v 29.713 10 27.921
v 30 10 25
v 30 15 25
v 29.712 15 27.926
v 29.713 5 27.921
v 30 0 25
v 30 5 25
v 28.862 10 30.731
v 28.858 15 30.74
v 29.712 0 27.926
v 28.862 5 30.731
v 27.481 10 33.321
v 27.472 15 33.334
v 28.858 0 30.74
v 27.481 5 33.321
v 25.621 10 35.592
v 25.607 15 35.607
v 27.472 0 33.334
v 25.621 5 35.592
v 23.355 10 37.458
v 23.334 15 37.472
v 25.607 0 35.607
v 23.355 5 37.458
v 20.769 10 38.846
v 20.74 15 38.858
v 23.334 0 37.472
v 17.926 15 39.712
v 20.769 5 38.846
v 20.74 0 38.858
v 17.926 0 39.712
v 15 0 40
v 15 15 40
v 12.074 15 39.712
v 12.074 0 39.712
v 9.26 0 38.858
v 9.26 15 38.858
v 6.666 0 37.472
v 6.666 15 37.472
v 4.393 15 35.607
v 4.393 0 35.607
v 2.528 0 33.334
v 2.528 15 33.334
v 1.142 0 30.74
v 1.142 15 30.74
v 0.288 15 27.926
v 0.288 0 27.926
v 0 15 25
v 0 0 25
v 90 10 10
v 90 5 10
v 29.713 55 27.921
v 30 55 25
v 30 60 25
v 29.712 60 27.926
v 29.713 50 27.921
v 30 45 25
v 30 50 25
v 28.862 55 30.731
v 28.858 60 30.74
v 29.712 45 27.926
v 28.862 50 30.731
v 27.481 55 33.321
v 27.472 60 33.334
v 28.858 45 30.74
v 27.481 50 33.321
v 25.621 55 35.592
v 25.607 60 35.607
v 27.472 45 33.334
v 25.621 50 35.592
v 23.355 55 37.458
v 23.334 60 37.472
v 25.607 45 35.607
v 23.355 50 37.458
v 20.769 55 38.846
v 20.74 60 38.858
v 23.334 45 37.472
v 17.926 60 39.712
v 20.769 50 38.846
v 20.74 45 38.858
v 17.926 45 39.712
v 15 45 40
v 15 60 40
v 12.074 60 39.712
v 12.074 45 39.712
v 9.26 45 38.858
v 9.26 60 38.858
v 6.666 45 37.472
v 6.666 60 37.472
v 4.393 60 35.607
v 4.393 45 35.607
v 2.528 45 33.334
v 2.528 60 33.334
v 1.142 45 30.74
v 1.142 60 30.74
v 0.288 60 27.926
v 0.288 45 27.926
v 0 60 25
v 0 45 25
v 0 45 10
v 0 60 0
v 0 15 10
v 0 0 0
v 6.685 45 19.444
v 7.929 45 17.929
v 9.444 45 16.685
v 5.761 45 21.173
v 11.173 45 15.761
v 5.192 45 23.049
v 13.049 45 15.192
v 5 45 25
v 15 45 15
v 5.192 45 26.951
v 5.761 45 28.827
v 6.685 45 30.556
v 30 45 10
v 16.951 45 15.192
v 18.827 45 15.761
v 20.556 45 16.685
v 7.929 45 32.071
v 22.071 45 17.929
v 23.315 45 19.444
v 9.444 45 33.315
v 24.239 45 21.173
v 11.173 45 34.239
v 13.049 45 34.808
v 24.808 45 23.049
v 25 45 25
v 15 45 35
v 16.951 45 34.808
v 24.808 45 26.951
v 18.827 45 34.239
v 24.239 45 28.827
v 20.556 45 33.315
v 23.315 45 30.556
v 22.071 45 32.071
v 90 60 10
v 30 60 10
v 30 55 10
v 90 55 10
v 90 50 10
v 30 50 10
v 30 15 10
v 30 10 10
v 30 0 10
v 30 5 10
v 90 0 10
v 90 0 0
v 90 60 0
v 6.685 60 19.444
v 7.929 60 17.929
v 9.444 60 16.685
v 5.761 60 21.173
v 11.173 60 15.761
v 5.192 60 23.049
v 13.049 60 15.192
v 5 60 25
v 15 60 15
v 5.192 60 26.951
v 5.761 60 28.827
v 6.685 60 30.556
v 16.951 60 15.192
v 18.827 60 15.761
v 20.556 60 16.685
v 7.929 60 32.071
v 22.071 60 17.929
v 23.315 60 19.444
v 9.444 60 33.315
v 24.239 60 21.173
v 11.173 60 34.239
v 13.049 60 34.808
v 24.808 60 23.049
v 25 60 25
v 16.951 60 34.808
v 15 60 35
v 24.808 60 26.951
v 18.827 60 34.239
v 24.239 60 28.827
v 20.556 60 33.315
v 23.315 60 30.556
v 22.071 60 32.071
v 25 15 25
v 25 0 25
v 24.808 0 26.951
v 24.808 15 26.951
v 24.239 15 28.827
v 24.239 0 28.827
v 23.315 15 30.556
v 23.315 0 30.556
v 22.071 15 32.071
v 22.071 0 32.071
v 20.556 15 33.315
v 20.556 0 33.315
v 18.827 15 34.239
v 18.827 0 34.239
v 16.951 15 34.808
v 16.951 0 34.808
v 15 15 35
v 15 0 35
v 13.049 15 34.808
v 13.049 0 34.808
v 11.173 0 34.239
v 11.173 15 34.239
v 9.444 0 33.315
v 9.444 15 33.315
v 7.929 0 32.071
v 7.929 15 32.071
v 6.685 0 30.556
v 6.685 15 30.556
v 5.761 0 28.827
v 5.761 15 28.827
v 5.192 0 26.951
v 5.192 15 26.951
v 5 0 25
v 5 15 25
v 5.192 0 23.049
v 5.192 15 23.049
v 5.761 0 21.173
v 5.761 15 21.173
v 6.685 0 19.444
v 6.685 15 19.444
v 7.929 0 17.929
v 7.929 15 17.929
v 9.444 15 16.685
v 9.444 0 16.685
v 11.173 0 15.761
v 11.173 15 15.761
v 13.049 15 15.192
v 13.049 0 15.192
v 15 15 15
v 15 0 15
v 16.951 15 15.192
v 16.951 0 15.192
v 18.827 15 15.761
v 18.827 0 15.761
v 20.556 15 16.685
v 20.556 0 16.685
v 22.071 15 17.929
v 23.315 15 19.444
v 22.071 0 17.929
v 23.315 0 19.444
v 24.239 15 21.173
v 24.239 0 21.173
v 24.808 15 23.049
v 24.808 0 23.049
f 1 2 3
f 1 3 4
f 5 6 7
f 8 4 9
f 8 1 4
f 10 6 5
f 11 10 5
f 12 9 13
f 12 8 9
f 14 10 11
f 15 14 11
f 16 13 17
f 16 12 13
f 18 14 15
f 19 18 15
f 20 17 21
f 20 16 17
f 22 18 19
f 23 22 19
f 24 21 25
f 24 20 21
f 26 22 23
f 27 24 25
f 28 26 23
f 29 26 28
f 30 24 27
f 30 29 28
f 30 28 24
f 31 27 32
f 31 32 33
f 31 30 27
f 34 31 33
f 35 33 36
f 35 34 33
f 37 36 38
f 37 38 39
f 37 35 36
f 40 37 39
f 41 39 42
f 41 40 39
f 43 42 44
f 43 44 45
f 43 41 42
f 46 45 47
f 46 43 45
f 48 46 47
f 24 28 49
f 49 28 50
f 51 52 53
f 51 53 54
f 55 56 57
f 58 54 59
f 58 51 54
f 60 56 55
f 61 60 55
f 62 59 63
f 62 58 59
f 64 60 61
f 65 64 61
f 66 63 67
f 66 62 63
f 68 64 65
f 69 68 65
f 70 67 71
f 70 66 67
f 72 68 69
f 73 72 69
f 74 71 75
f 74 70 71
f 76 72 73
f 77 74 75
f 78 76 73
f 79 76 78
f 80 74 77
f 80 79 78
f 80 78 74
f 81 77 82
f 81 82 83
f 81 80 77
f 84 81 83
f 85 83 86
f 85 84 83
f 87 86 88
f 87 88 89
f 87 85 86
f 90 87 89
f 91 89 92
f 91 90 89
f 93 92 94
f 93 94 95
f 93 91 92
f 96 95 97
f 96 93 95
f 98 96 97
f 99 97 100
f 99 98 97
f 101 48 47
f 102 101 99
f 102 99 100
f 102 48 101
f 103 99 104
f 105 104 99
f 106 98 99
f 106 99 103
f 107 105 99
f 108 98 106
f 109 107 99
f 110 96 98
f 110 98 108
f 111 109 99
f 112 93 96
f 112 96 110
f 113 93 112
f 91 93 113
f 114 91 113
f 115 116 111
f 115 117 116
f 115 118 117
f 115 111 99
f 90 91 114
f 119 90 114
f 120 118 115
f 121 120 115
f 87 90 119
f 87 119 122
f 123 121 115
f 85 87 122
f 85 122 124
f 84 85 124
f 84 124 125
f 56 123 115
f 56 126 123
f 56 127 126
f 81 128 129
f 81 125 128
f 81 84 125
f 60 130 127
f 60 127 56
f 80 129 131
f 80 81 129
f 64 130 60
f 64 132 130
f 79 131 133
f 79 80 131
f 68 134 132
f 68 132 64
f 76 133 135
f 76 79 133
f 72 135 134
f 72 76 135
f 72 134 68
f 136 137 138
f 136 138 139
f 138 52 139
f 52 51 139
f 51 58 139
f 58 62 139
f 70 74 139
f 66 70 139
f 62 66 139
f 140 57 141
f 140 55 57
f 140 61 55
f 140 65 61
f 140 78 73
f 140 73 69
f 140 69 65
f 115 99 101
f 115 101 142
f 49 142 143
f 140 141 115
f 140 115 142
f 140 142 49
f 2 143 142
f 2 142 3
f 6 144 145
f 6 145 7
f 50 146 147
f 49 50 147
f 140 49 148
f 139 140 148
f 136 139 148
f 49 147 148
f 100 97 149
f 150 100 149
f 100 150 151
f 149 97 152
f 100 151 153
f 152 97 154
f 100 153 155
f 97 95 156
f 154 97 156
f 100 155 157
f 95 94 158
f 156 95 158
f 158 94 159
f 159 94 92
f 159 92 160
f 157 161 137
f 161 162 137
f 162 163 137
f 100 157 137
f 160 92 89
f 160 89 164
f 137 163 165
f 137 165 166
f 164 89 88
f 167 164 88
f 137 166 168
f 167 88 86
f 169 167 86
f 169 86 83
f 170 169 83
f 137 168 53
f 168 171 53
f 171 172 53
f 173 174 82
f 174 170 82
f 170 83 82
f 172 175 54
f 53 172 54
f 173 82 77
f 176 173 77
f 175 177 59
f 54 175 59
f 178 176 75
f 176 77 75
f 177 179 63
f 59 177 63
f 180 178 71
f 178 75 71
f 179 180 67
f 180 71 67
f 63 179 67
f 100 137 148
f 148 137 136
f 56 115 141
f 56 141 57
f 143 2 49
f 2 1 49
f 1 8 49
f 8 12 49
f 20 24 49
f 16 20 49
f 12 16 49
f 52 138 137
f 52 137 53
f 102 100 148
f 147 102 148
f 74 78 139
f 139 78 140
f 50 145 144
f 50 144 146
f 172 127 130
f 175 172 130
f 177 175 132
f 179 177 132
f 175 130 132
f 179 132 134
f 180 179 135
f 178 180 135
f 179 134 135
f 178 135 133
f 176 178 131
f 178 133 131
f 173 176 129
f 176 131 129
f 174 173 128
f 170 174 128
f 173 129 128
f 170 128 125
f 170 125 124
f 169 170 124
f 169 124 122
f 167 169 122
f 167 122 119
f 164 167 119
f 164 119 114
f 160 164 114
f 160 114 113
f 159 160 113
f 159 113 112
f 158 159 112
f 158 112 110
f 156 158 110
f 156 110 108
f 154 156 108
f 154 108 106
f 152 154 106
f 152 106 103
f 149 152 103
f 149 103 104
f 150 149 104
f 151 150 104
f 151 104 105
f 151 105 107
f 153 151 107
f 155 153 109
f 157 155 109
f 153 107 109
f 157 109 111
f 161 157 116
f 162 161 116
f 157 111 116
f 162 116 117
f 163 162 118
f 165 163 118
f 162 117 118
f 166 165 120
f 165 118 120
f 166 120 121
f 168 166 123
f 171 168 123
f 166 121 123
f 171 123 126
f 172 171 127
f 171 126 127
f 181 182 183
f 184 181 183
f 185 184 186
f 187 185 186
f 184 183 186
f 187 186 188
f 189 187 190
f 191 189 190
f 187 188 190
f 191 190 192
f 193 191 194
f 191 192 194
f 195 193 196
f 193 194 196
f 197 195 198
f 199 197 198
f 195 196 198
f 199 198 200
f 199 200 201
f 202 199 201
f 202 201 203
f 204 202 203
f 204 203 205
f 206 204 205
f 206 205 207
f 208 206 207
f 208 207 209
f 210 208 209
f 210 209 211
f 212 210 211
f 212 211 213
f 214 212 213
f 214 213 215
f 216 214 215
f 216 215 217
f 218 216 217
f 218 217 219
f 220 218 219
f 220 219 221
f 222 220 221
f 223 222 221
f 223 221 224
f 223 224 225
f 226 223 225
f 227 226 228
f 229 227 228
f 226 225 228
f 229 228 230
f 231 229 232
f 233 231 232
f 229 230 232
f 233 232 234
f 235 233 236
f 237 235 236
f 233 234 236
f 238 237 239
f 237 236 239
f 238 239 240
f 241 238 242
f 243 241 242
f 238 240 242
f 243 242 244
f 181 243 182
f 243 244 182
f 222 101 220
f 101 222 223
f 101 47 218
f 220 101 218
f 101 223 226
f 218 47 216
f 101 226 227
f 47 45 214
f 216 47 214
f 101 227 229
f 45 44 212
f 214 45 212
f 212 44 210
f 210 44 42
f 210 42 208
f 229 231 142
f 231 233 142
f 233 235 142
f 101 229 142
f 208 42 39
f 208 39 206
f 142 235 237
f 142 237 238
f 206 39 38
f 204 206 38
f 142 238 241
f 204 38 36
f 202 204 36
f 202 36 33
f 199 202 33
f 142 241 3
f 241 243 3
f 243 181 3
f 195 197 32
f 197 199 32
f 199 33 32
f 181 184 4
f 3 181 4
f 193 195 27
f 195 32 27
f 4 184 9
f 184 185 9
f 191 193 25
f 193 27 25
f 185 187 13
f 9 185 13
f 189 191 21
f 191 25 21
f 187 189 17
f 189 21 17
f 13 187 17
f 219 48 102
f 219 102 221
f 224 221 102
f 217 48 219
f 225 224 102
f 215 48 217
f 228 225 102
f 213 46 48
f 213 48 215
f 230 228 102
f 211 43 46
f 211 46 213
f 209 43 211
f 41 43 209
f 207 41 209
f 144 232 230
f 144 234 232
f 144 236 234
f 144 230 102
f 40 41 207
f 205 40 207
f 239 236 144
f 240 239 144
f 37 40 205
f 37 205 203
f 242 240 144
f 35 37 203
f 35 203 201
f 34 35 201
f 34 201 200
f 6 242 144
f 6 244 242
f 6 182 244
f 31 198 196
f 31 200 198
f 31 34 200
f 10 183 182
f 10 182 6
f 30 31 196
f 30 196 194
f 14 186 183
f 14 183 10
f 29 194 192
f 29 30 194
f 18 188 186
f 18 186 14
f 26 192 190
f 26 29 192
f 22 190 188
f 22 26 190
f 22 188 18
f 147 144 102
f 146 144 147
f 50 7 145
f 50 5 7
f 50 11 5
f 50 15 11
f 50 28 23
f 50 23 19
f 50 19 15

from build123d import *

# Parameters (mm, degrees)
SKETCH_W               = 90
SKETCH_H               = 60
PAD_DEPTH              = 10
PAD001_DEPTH           = 7.5
PAD002_DEPTH           = 2.5
LINEARPATTERN_COUNT    = 2
LINEARPATTERN_PITCH    = 45
LINEARPATTERN001_COUNT = 2
LINEARPATTERN001_PITCH = 45
SKETCH003_R            = 10
POCKET_DEPTH           = 60


with BuildPart() as part:
    # Sketch → Pad (new body)
    with BuildSketch(Plane.XY):
        with Locations((45, 30)):
            Rectangle(SKETCH_W, SKETCH_H)
    extrude(amount=PAD_DEPTH)

    # Sketch001 → Pad001 (join, symmetric)
    with BuildSketch(Plane.XZ.offset(-7.5)):
        with BuildLine():
            Line((0, 25), (0, 10))
            Line((0, 10), (30, 10))
            Line((30, 10), (30, 25))
            ThreePointArc((30, 25), (15, 40.000025), (0, 25))
        make_face()
    pad001 = extrude(amount=PAD001_DEPTH, both=True)

    # Sketch002 → Pad002 (join, symmetric)
    with BuildSketch(Plane.XZ.offset(-7.5)):
        with BuildLine():
            Line((30, 25), (30, 10))
            Line((30, 10), (90, 10))
            Line((20.769255, 38.846169), (90, 10))
            ThreePointArc((30, 25), (27.480768, 33.320507), (20.769255, 38.846169))
        make_face()
    pad002 = extrude(amount=PAD002_DEPTH, both=True)

    # LinearPattern: Pad001 ×2
    with Locations(*[(0, i * LINEARPATTERN_PITCH, 0) for i in range(1, LINEARPATTERN_COUNT)]):
        add(pad001)

    # LinearPattern001: Pad002 ×2
    with Locations(*[(0, i * LINEARPATTERN001_PITCH, 0) for i in range(1, LINEARPATTERN001_COUNT)]):
        add(pad002)

    # Sketch003 (on Face5 of LinearPattern001) → Pocket (cut)
    with BuildSketch(Plane.XZ):
        with Locations((15, 25.000025)):
            Circle(SKETCH003_R)
    extrude(amount=-POCKET_DEPTH, mode=Mode.SUBTRACT)


solid = part.part
